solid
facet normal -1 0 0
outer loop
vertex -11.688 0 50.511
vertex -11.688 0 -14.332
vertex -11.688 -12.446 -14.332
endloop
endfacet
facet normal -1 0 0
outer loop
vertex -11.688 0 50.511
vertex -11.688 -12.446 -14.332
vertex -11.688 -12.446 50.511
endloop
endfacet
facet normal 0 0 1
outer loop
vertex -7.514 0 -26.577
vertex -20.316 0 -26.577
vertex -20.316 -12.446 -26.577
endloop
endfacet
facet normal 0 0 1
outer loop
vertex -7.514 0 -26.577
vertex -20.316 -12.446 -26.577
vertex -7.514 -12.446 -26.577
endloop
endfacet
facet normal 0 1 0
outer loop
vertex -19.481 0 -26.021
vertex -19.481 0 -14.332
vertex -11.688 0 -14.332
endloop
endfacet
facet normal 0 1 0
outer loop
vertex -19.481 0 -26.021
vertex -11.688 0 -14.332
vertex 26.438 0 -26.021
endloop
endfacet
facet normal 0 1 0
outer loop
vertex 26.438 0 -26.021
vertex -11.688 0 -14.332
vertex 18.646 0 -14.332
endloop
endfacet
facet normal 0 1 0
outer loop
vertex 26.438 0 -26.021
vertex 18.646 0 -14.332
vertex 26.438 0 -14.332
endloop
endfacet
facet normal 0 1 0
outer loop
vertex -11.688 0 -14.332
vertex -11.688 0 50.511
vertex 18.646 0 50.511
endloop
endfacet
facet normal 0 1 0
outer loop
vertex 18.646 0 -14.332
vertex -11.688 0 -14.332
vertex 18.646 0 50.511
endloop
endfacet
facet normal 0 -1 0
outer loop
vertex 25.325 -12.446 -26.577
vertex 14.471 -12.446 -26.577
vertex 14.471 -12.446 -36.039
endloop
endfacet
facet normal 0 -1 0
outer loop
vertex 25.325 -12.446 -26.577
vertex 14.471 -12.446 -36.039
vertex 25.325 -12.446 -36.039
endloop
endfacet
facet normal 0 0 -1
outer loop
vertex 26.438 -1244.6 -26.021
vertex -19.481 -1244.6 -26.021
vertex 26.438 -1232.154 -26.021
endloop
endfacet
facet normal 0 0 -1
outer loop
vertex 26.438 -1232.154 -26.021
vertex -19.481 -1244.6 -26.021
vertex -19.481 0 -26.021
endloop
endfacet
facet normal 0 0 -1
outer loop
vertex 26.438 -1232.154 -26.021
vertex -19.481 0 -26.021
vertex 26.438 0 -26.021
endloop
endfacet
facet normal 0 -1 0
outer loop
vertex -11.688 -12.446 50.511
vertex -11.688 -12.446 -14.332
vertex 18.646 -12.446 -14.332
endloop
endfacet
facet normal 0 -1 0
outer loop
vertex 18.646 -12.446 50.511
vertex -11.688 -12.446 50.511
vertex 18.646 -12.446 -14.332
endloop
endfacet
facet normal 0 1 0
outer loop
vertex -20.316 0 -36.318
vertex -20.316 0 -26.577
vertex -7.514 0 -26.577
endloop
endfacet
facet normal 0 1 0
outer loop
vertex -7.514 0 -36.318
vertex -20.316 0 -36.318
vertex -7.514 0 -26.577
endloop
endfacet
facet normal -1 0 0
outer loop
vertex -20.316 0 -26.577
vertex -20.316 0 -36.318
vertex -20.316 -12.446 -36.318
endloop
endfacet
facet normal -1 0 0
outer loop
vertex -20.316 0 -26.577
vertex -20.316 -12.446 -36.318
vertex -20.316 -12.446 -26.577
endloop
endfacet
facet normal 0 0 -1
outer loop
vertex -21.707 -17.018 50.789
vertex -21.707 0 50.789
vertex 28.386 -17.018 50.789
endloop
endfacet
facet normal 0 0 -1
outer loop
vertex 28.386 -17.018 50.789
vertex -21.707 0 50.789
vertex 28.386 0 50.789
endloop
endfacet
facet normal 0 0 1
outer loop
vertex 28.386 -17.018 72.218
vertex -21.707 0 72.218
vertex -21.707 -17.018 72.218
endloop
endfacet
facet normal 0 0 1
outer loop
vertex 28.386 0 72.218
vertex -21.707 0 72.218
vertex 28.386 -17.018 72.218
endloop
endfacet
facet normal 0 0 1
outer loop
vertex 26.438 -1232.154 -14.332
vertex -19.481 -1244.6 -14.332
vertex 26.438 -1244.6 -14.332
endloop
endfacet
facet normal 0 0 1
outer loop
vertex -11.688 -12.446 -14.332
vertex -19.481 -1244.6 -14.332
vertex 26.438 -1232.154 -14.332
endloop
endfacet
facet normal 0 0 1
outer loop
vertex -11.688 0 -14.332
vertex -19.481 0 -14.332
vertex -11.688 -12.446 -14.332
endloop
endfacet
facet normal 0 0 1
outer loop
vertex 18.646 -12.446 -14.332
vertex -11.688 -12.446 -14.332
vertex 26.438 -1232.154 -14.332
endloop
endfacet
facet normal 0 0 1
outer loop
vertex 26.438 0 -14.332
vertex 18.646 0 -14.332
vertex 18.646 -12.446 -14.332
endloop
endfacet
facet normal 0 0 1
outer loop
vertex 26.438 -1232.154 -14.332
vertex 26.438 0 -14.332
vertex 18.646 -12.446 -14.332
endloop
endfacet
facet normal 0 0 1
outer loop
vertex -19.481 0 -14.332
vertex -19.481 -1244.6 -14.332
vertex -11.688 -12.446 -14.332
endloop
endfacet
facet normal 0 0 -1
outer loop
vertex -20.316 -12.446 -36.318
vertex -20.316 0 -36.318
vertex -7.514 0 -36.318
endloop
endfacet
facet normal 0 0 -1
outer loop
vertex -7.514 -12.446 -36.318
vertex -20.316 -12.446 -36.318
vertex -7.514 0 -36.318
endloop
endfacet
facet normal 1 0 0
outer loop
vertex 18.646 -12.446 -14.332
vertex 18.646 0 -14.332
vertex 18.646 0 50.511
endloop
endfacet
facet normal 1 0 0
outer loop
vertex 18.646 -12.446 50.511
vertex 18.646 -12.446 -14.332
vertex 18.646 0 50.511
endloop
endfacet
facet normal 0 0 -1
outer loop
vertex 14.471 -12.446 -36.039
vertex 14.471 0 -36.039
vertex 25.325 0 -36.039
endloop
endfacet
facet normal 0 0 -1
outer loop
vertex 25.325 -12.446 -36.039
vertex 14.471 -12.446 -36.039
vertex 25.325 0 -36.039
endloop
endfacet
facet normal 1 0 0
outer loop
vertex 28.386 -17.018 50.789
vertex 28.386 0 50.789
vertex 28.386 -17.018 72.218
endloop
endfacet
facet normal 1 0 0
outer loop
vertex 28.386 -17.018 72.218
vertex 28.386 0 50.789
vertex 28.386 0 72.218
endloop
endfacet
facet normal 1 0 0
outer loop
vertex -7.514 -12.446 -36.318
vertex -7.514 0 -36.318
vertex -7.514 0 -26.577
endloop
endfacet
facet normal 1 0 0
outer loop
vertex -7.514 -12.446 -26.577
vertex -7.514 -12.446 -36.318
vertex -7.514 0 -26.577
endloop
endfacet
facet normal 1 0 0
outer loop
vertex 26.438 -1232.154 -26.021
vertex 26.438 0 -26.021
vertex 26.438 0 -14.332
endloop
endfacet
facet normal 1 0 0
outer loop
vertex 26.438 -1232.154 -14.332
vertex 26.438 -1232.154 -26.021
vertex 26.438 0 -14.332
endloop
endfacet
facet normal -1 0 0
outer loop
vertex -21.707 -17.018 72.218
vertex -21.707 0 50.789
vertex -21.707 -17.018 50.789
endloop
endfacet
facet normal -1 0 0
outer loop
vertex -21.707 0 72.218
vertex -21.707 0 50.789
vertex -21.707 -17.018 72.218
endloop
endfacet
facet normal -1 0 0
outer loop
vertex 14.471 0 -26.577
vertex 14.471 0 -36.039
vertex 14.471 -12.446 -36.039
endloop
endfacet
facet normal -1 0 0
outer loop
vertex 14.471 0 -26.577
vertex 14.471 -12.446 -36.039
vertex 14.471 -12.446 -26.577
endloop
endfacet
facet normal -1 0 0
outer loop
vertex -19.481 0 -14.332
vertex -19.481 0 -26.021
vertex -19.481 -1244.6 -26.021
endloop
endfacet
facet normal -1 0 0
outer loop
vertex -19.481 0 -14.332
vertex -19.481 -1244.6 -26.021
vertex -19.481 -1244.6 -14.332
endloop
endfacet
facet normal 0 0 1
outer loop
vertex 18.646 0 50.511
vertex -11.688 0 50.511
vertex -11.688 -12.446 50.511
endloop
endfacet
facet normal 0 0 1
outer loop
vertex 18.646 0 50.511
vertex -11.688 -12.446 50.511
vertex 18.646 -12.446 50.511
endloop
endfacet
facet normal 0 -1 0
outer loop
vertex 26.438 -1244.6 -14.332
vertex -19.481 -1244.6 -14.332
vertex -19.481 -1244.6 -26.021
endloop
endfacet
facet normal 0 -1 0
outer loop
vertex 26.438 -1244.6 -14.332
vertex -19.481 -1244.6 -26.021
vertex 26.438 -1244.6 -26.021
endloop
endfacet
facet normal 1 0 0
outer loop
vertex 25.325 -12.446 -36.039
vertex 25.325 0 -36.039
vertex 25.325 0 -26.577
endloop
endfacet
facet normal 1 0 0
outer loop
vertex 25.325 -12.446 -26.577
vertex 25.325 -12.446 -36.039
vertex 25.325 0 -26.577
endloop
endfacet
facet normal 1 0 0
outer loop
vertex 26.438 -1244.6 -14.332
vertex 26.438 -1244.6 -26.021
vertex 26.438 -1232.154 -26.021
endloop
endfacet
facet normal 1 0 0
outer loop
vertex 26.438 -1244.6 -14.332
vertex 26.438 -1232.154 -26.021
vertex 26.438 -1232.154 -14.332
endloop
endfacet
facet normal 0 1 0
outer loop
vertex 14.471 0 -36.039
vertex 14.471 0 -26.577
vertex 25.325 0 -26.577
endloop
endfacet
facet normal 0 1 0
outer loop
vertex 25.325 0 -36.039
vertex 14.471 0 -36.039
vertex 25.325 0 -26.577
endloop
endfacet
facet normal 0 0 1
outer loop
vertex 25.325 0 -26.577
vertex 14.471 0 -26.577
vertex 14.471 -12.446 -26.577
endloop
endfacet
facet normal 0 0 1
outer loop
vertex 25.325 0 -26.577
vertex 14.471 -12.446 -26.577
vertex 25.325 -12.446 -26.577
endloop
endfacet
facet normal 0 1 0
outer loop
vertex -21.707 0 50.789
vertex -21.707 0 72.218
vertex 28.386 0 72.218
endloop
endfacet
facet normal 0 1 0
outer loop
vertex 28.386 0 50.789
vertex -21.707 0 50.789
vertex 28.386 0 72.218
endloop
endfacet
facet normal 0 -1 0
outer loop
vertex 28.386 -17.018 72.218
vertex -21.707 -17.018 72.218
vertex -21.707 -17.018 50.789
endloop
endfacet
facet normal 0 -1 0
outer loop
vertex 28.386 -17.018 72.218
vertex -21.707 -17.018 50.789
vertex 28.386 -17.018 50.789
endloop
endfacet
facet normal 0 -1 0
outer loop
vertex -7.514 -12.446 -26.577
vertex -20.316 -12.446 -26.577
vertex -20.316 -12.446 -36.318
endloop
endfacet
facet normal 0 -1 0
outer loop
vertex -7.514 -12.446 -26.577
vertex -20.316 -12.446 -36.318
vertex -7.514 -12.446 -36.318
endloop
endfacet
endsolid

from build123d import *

# Parameters (mm, degrees)
F1_W      = 50.093217
F1_H      = 21.428767
F5_DEPTH  = 17.018
F0_W      = 30.334227
F0_H      = 64.842886
F6_DEPTH  = 12.446
F2_W      = 45.918781
F2_H      = 11.688418
F7_DEPTH  = 1244.6
F7_FACE_W = 45.918782
F7_FACE_H = 11.688418
F8_DEPTH  = 12.446
F4_W      = 10.853528
F4_H      = 9.462051
F9_DEPTH  = 12.446
F3_W      = 12.801599
F3_H      = 9.740349
F10_DEPTH = 12.446


with BuildPart() as f5:
    # F1 (on Front) → F5 (new body)
    with BuildSketch(Plane.XZ):
        with Locations((3.339546, 61.503342)):
            Rectangle(F1_W, F1_H)
    extrude(amount=F5_DEPTH)


with BuildPart() as f6:
    # F0 (on Front) → F6 (new body)
    with BuildSketch(Plane.XZ):
        with Locations((3.478697, 18.089217)):
            Rectangle(F0_W, F0_H)
    extrude(amount=F6_DEPTH)

    # F2 (on Front) → F7 (join)
    with BuildSketch(Plane.XZ):
        with Locations((3.478694, -20.176435)):
            Rectangle(F2_W, F2_H)
    extrude(amount=F7_DEPTH)

    # F7_face (on face) → F8 (join)
    with BuildSketch(Plane(origin=(3.478695, -1244.6, -20.176435), x_dir=(1, 0, 0), z_dir=(0, -1, 0))):
        Rectangle(F7_FACE_W, F7_FACE_H)
    extrude(amount=-F8_DEPTH)


with BuildPart() as f9:
    # F4 (on Front) → F9 (new body)
    with BuildSketch(Plane.XZ):
        with Locations((19.898139, -31.308259)):
            Rectangle(F4_W, F4_H)
    extrude(amount=F9_DEPTH)


with BuildPart() as f10:
    # F3 (on Front) → F10 (new body)
    with BuildSketch(Plane.XZ):
        with Locations((-13.914782, -31.447408)):
            Rectangle(F3_W, F3_H)
    extrude(amount=F10_DEPTH)


solid = Compound([f5.part, f6.part, f9.part, f10.part])
